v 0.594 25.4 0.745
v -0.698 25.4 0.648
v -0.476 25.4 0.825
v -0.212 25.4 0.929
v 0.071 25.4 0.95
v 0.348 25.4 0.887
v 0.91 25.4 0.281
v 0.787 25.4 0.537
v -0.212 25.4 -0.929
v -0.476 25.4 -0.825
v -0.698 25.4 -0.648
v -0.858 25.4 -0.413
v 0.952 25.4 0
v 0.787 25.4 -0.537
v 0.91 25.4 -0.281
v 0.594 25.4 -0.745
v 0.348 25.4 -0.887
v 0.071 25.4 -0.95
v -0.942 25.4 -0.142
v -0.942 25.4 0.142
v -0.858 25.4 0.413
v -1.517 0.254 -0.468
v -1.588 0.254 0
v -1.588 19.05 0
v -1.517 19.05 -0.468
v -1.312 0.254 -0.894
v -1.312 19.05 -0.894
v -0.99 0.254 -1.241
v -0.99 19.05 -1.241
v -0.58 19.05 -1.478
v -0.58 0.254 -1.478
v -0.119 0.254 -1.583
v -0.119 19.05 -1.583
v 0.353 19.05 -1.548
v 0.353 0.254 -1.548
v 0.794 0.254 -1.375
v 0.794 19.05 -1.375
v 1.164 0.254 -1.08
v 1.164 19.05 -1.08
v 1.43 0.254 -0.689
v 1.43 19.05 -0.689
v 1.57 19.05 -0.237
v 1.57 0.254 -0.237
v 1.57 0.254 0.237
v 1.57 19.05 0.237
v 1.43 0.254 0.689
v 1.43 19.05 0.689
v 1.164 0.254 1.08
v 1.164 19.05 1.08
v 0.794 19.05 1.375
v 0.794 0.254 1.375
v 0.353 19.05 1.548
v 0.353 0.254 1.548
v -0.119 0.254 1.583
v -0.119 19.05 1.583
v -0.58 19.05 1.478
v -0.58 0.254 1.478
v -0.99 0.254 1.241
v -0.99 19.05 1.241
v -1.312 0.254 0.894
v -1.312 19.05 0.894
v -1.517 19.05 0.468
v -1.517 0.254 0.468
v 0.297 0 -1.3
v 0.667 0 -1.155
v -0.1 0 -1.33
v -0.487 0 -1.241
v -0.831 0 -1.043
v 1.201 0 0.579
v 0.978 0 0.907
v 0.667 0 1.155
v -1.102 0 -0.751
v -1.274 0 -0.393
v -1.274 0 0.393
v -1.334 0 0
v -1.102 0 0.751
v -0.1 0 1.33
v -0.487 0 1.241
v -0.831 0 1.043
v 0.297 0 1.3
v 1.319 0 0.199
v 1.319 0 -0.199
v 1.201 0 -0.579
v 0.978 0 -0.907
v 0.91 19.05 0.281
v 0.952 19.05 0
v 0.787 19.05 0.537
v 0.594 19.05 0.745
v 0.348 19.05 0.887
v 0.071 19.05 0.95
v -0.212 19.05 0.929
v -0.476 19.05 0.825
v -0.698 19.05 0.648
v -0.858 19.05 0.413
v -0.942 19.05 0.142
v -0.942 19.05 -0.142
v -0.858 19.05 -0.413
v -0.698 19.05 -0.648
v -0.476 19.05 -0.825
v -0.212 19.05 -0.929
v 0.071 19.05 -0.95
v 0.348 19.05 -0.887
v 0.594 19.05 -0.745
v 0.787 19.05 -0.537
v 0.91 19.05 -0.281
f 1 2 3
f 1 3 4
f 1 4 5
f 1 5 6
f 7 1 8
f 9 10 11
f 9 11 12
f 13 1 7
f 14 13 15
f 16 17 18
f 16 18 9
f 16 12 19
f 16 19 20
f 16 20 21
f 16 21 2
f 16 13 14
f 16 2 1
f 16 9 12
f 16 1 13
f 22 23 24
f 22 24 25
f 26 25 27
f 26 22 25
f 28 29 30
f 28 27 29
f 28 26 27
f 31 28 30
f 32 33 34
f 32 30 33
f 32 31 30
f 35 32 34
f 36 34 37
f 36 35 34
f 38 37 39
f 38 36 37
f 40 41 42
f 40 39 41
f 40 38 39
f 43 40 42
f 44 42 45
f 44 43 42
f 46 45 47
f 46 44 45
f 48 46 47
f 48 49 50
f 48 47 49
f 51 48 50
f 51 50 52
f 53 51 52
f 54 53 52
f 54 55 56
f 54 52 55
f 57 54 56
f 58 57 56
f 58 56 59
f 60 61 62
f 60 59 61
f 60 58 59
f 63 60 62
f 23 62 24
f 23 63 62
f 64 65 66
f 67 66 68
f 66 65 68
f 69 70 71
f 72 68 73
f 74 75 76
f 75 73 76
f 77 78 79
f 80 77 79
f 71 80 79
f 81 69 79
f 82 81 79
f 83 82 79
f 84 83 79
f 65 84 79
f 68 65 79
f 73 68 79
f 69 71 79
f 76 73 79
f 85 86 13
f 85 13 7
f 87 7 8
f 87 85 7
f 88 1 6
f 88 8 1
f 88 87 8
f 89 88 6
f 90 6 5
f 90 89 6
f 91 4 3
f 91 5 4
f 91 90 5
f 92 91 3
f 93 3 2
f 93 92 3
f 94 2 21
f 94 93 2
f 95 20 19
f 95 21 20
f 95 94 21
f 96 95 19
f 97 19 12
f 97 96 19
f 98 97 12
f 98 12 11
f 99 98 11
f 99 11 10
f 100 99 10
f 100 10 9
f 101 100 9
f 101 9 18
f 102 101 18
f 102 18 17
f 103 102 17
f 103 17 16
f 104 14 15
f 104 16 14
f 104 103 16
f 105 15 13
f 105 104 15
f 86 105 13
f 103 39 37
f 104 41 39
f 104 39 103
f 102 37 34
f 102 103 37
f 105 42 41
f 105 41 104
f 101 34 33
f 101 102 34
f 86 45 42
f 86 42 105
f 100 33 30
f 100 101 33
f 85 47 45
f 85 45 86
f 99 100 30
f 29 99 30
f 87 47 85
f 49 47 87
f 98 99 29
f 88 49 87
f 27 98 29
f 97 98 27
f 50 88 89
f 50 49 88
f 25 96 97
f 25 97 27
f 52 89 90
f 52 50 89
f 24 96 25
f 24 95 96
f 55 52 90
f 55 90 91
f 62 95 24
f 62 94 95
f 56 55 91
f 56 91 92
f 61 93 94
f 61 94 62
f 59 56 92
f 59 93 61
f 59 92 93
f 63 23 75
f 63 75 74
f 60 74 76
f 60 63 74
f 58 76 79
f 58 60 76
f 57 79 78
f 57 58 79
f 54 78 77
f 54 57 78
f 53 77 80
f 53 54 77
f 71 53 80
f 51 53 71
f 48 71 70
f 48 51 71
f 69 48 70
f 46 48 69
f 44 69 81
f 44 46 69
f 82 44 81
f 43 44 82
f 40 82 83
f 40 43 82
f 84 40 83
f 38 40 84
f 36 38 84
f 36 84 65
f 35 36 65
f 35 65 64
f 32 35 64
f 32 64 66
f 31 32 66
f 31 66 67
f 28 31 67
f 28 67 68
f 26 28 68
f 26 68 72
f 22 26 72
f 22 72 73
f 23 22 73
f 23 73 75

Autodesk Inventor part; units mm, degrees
ref_plane "YZ Plane" through (0, 0, 0) normal (1, 0, 0) x (0, 1, 0)
ref_plane "XZ Plane" through (0, 0, 0) normal (0, 1, 0) x (-1, 0, 0)
ref_plane "XY Plane" through (0, 0, 0) normal (0, 0, 1) x (1, 0, 0)
sketch "Sketch1" plane through (0, 0, 0) normal (0, 1, 0) x (-1, 0, 0)
  circle A0 centre (0, 0) radius 1.5875
  dimension "d0" = 3.175
extrude "Extrusion1" add sketch "Sketch1" along normal blind 19.05
thread "Thread1"
chamfer "Chamfer1" distance 0.254 angle 45 1 edges at (1.5875, 0, 0)
sketch "Sketch3" plane through (0, 0, 0) normal (1, 0, 0) x (0, 1, 0)
  point P0 (0, 0)
sketch "Sketch4" plane through (0, 19.05, 0) normal (0, 1, 0) x (1, 0, 0)
  circle A0 centre (0, 0) radius 0.9525
  dimension "d11" = 1.905
extrude "Extrusion3" add sketch "Sketch4" along normal blind 6.35
properties part number "burner_rod_1or3"
